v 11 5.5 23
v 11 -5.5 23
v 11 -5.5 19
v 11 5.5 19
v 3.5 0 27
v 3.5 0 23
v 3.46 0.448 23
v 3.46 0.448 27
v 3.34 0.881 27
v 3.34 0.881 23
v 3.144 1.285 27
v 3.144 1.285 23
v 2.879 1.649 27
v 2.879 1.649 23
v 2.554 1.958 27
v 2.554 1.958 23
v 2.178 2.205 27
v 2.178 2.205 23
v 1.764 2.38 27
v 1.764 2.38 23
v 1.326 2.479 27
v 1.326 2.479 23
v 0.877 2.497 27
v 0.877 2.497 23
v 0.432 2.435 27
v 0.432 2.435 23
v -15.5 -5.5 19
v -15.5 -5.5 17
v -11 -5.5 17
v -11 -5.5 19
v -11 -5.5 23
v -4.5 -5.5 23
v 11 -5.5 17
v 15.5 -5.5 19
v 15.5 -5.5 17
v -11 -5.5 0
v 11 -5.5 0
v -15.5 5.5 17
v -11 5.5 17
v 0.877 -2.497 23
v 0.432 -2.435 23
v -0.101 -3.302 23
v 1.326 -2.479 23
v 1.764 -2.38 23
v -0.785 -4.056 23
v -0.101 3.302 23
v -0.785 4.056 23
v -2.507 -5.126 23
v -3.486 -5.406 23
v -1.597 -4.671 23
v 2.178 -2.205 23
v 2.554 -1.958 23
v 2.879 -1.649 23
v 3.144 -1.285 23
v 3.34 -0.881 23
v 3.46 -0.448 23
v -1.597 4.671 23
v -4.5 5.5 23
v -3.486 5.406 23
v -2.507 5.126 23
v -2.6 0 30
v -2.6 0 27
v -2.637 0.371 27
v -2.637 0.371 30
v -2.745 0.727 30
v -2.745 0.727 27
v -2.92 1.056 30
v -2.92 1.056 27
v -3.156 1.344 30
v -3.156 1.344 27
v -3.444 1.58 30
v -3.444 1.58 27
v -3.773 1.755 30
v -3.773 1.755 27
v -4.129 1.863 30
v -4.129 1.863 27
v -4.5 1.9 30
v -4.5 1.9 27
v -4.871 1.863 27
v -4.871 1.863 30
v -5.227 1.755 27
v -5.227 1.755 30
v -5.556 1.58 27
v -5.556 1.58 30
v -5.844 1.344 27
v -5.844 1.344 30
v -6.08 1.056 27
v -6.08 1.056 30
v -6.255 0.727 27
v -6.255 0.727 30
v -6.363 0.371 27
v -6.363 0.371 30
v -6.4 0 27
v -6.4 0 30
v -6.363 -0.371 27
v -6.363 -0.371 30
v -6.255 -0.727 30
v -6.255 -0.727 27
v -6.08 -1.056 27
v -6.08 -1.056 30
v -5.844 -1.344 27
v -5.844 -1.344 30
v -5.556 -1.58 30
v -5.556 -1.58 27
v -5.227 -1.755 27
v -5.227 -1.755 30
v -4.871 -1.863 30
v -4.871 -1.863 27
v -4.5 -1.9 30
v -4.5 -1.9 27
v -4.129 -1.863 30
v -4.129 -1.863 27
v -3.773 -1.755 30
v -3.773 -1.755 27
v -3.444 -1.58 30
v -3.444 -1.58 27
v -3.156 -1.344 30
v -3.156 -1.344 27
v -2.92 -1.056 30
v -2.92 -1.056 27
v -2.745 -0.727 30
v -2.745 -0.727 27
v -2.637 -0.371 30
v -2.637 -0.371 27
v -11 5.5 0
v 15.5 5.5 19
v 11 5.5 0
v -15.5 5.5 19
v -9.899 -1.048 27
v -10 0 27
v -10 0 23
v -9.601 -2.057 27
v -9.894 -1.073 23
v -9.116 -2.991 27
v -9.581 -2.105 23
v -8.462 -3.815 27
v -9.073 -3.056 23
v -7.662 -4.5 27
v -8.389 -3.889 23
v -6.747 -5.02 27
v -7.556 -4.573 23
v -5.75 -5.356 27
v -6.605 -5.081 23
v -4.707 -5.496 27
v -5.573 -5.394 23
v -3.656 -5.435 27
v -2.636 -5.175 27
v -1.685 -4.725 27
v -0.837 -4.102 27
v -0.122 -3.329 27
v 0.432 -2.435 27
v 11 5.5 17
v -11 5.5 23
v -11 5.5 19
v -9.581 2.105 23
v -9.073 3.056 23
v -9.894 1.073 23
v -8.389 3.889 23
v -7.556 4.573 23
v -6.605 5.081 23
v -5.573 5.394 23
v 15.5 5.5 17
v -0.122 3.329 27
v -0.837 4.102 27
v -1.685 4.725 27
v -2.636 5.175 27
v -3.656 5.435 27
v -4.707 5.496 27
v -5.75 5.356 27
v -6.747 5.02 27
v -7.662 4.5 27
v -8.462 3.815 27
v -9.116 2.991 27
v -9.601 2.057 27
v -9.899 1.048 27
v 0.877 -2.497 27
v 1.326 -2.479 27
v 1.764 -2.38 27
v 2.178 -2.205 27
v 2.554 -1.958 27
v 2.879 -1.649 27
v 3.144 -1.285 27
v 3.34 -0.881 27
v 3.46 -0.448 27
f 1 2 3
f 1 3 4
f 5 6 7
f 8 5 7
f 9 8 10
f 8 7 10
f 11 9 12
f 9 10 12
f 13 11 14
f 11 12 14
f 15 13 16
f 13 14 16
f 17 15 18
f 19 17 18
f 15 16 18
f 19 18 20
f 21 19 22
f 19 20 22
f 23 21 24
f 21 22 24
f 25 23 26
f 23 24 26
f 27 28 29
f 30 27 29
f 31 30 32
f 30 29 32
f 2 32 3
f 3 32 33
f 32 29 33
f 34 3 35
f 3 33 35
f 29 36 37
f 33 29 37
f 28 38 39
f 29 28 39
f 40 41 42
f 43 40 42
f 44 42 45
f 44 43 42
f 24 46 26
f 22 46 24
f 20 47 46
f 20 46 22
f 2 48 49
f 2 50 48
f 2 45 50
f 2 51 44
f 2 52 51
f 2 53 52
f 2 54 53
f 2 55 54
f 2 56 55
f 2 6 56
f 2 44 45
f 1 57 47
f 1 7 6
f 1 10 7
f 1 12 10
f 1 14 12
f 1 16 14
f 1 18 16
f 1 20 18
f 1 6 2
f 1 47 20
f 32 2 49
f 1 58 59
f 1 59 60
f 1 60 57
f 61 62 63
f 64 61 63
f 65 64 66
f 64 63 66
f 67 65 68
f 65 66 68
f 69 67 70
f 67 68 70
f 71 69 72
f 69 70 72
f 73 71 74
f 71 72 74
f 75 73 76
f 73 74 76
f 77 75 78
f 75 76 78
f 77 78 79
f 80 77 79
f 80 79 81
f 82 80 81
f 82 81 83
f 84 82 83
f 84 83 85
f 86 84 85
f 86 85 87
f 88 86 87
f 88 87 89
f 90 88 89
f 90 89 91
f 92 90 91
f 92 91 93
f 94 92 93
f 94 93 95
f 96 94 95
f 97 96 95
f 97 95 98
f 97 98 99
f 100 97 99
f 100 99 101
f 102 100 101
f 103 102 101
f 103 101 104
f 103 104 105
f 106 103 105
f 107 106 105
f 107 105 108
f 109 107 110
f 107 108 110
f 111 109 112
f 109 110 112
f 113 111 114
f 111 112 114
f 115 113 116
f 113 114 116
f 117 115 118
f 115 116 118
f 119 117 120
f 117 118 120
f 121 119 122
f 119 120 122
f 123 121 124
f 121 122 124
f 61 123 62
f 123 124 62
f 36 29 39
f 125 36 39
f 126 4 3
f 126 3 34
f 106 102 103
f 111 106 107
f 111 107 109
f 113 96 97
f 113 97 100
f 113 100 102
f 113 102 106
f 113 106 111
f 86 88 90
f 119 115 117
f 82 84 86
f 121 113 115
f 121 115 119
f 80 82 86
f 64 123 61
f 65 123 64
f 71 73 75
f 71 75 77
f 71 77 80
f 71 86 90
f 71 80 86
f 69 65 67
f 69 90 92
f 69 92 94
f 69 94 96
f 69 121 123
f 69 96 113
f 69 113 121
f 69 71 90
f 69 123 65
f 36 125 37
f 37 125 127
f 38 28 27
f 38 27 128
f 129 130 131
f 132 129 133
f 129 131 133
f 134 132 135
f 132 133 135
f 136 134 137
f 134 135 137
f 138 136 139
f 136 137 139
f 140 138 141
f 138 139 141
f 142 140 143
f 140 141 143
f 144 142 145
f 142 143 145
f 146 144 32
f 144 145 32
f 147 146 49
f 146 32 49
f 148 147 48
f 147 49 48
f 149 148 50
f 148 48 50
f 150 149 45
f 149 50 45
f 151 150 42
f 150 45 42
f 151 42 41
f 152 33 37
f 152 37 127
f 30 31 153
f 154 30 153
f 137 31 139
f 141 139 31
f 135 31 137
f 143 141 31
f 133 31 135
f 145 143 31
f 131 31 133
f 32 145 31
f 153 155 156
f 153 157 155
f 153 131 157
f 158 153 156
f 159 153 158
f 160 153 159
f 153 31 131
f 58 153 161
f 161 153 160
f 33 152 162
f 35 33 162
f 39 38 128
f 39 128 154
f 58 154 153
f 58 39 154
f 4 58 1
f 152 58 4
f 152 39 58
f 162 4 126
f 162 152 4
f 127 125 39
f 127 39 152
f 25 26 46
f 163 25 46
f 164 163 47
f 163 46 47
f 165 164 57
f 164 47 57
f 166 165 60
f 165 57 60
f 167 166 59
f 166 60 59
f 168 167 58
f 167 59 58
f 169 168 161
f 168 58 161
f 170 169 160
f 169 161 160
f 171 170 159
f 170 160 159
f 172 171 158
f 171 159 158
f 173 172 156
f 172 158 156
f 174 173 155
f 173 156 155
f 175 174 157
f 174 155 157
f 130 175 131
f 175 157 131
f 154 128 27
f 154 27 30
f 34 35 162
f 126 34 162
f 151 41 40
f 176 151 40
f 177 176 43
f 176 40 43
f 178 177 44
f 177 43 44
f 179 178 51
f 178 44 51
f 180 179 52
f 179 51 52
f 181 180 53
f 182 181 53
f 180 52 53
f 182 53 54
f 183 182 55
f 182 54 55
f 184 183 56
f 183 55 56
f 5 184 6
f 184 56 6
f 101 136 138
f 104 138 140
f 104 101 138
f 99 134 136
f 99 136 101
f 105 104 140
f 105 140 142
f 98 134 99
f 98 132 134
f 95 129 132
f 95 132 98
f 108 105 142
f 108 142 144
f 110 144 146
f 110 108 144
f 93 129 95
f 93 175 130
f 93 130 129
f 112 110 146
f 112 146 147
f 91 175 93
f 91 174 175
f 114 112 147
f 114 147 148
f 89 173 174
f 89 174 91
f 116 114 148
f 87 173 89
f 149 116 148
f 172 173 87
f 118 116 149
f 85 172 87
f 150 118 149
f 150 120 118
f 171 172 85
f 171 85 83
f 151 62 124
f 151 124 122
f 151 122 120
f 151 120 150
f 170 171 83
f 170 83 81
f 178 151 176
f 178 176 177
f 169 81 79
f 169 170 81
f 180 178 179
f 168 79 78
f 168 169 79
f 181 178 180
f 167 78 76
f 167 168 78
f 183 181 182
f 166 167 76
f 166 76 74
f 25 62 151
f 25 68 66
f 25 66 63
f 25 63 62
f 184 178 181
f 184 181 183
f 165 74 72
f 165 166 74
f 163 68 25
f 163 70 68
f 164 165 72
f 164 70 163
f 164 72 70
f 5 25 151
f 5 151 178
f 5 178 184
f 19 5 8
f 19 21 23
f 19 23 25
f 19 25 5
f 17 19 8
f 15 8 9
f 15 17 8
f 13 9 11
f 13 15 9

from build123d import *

# Parameters (mm, degrees)
SKETCH2_W           = 31
SKETCH2_H           = 11
SKETCH2_R           = 1.9
BOSS_EXTRUDE1_DEPTH = 23
SKETCH2_2_R         = 1.9
BOSS_EXTRUDE2_DEPTH = 30
SKETCH3_W           = 4.5
SKETCH3_H           = 11
CUT_EXTRUDE1_DEPTH  = 4
CUT_EXTRUDE2_START  = -6
SKETCH3_5_W         = 4.5
SKETCH3_5_H         = 11
CUT_EXTRUDE2_DEPTH  = 23.275431031
BOSS_EXTRUDE3_DEPTH = 4


with BuildPart() as part:
    # Sketch2 → Boss-Extrude1 (new body)
    with BuildSketch(Plane.XY):
        Rectangle(SKETCH2_W, SKETCH2_H)
        with Locations((-4.5, 0)):
            Circle(SKETCH2_R, mode=Mode.SUBTRACT)
    extrude(amount=BOSS_EXTRUDE1_DEPTH)

    # Sketch2<2> → Boss-Extrude2 (add)
    with BuildSketch(Plane.XY):
        with Locations((-4.5, 0)):
            Circle(SKETCH2_2_R)
    extrude(amount=BOSS_EXTRUDE2_DEPTH)

    # Sketch3 → Cut-Extrude1 (cut)
    with BuildSketch(Plane.XY.offset(23)):
        with Locations((-13.25, 0)):
            Rectangle(SKETCH3_W, SKETCH3_H)
        with Locations((13.25, 0)):
            Rectangle(SKETCH3_W, SKETCH3_H)
    extrude(amount=-CUT_EXTRUDE1_DEPTH, mode=Mode.SUBTRACT)

    # Sketch3<5> → Cut-Extrude2 (cut, through all)
    with BuildSketch(Plane.XY.offset(23).offset(CUT_EXTRUDE2_START)):
        with Locations((-13.25, 0)):
            Rectangle(SKETCH3_5_W, SKETCH3_5_H)
        with Locations((13.25, 0)):
            Rectangle(SKETCH3_5_W, SKETCH3_5_H)
    extrude(amount=-CUT_EXTRUDE2_DEPTH, mode=Mode.SUBTRACT)

    # Sketch4 → Boss-Extrude3 (add)
    with BuildSketch(Plane.XY.offset(23)):
        with BuildLine():
            ThreePointArc((0.431818182, 2.434577873), (-10, 0), (0.431818182, -2.434577873))
            ThreePointArc((0.431818182, -2.434577873), (3.5, 0), (0.431818182, 2.434577873))
        make_face()
    extrude(amount=BOSS_EXTRUDE3_DEPTH)


solid = part.part
